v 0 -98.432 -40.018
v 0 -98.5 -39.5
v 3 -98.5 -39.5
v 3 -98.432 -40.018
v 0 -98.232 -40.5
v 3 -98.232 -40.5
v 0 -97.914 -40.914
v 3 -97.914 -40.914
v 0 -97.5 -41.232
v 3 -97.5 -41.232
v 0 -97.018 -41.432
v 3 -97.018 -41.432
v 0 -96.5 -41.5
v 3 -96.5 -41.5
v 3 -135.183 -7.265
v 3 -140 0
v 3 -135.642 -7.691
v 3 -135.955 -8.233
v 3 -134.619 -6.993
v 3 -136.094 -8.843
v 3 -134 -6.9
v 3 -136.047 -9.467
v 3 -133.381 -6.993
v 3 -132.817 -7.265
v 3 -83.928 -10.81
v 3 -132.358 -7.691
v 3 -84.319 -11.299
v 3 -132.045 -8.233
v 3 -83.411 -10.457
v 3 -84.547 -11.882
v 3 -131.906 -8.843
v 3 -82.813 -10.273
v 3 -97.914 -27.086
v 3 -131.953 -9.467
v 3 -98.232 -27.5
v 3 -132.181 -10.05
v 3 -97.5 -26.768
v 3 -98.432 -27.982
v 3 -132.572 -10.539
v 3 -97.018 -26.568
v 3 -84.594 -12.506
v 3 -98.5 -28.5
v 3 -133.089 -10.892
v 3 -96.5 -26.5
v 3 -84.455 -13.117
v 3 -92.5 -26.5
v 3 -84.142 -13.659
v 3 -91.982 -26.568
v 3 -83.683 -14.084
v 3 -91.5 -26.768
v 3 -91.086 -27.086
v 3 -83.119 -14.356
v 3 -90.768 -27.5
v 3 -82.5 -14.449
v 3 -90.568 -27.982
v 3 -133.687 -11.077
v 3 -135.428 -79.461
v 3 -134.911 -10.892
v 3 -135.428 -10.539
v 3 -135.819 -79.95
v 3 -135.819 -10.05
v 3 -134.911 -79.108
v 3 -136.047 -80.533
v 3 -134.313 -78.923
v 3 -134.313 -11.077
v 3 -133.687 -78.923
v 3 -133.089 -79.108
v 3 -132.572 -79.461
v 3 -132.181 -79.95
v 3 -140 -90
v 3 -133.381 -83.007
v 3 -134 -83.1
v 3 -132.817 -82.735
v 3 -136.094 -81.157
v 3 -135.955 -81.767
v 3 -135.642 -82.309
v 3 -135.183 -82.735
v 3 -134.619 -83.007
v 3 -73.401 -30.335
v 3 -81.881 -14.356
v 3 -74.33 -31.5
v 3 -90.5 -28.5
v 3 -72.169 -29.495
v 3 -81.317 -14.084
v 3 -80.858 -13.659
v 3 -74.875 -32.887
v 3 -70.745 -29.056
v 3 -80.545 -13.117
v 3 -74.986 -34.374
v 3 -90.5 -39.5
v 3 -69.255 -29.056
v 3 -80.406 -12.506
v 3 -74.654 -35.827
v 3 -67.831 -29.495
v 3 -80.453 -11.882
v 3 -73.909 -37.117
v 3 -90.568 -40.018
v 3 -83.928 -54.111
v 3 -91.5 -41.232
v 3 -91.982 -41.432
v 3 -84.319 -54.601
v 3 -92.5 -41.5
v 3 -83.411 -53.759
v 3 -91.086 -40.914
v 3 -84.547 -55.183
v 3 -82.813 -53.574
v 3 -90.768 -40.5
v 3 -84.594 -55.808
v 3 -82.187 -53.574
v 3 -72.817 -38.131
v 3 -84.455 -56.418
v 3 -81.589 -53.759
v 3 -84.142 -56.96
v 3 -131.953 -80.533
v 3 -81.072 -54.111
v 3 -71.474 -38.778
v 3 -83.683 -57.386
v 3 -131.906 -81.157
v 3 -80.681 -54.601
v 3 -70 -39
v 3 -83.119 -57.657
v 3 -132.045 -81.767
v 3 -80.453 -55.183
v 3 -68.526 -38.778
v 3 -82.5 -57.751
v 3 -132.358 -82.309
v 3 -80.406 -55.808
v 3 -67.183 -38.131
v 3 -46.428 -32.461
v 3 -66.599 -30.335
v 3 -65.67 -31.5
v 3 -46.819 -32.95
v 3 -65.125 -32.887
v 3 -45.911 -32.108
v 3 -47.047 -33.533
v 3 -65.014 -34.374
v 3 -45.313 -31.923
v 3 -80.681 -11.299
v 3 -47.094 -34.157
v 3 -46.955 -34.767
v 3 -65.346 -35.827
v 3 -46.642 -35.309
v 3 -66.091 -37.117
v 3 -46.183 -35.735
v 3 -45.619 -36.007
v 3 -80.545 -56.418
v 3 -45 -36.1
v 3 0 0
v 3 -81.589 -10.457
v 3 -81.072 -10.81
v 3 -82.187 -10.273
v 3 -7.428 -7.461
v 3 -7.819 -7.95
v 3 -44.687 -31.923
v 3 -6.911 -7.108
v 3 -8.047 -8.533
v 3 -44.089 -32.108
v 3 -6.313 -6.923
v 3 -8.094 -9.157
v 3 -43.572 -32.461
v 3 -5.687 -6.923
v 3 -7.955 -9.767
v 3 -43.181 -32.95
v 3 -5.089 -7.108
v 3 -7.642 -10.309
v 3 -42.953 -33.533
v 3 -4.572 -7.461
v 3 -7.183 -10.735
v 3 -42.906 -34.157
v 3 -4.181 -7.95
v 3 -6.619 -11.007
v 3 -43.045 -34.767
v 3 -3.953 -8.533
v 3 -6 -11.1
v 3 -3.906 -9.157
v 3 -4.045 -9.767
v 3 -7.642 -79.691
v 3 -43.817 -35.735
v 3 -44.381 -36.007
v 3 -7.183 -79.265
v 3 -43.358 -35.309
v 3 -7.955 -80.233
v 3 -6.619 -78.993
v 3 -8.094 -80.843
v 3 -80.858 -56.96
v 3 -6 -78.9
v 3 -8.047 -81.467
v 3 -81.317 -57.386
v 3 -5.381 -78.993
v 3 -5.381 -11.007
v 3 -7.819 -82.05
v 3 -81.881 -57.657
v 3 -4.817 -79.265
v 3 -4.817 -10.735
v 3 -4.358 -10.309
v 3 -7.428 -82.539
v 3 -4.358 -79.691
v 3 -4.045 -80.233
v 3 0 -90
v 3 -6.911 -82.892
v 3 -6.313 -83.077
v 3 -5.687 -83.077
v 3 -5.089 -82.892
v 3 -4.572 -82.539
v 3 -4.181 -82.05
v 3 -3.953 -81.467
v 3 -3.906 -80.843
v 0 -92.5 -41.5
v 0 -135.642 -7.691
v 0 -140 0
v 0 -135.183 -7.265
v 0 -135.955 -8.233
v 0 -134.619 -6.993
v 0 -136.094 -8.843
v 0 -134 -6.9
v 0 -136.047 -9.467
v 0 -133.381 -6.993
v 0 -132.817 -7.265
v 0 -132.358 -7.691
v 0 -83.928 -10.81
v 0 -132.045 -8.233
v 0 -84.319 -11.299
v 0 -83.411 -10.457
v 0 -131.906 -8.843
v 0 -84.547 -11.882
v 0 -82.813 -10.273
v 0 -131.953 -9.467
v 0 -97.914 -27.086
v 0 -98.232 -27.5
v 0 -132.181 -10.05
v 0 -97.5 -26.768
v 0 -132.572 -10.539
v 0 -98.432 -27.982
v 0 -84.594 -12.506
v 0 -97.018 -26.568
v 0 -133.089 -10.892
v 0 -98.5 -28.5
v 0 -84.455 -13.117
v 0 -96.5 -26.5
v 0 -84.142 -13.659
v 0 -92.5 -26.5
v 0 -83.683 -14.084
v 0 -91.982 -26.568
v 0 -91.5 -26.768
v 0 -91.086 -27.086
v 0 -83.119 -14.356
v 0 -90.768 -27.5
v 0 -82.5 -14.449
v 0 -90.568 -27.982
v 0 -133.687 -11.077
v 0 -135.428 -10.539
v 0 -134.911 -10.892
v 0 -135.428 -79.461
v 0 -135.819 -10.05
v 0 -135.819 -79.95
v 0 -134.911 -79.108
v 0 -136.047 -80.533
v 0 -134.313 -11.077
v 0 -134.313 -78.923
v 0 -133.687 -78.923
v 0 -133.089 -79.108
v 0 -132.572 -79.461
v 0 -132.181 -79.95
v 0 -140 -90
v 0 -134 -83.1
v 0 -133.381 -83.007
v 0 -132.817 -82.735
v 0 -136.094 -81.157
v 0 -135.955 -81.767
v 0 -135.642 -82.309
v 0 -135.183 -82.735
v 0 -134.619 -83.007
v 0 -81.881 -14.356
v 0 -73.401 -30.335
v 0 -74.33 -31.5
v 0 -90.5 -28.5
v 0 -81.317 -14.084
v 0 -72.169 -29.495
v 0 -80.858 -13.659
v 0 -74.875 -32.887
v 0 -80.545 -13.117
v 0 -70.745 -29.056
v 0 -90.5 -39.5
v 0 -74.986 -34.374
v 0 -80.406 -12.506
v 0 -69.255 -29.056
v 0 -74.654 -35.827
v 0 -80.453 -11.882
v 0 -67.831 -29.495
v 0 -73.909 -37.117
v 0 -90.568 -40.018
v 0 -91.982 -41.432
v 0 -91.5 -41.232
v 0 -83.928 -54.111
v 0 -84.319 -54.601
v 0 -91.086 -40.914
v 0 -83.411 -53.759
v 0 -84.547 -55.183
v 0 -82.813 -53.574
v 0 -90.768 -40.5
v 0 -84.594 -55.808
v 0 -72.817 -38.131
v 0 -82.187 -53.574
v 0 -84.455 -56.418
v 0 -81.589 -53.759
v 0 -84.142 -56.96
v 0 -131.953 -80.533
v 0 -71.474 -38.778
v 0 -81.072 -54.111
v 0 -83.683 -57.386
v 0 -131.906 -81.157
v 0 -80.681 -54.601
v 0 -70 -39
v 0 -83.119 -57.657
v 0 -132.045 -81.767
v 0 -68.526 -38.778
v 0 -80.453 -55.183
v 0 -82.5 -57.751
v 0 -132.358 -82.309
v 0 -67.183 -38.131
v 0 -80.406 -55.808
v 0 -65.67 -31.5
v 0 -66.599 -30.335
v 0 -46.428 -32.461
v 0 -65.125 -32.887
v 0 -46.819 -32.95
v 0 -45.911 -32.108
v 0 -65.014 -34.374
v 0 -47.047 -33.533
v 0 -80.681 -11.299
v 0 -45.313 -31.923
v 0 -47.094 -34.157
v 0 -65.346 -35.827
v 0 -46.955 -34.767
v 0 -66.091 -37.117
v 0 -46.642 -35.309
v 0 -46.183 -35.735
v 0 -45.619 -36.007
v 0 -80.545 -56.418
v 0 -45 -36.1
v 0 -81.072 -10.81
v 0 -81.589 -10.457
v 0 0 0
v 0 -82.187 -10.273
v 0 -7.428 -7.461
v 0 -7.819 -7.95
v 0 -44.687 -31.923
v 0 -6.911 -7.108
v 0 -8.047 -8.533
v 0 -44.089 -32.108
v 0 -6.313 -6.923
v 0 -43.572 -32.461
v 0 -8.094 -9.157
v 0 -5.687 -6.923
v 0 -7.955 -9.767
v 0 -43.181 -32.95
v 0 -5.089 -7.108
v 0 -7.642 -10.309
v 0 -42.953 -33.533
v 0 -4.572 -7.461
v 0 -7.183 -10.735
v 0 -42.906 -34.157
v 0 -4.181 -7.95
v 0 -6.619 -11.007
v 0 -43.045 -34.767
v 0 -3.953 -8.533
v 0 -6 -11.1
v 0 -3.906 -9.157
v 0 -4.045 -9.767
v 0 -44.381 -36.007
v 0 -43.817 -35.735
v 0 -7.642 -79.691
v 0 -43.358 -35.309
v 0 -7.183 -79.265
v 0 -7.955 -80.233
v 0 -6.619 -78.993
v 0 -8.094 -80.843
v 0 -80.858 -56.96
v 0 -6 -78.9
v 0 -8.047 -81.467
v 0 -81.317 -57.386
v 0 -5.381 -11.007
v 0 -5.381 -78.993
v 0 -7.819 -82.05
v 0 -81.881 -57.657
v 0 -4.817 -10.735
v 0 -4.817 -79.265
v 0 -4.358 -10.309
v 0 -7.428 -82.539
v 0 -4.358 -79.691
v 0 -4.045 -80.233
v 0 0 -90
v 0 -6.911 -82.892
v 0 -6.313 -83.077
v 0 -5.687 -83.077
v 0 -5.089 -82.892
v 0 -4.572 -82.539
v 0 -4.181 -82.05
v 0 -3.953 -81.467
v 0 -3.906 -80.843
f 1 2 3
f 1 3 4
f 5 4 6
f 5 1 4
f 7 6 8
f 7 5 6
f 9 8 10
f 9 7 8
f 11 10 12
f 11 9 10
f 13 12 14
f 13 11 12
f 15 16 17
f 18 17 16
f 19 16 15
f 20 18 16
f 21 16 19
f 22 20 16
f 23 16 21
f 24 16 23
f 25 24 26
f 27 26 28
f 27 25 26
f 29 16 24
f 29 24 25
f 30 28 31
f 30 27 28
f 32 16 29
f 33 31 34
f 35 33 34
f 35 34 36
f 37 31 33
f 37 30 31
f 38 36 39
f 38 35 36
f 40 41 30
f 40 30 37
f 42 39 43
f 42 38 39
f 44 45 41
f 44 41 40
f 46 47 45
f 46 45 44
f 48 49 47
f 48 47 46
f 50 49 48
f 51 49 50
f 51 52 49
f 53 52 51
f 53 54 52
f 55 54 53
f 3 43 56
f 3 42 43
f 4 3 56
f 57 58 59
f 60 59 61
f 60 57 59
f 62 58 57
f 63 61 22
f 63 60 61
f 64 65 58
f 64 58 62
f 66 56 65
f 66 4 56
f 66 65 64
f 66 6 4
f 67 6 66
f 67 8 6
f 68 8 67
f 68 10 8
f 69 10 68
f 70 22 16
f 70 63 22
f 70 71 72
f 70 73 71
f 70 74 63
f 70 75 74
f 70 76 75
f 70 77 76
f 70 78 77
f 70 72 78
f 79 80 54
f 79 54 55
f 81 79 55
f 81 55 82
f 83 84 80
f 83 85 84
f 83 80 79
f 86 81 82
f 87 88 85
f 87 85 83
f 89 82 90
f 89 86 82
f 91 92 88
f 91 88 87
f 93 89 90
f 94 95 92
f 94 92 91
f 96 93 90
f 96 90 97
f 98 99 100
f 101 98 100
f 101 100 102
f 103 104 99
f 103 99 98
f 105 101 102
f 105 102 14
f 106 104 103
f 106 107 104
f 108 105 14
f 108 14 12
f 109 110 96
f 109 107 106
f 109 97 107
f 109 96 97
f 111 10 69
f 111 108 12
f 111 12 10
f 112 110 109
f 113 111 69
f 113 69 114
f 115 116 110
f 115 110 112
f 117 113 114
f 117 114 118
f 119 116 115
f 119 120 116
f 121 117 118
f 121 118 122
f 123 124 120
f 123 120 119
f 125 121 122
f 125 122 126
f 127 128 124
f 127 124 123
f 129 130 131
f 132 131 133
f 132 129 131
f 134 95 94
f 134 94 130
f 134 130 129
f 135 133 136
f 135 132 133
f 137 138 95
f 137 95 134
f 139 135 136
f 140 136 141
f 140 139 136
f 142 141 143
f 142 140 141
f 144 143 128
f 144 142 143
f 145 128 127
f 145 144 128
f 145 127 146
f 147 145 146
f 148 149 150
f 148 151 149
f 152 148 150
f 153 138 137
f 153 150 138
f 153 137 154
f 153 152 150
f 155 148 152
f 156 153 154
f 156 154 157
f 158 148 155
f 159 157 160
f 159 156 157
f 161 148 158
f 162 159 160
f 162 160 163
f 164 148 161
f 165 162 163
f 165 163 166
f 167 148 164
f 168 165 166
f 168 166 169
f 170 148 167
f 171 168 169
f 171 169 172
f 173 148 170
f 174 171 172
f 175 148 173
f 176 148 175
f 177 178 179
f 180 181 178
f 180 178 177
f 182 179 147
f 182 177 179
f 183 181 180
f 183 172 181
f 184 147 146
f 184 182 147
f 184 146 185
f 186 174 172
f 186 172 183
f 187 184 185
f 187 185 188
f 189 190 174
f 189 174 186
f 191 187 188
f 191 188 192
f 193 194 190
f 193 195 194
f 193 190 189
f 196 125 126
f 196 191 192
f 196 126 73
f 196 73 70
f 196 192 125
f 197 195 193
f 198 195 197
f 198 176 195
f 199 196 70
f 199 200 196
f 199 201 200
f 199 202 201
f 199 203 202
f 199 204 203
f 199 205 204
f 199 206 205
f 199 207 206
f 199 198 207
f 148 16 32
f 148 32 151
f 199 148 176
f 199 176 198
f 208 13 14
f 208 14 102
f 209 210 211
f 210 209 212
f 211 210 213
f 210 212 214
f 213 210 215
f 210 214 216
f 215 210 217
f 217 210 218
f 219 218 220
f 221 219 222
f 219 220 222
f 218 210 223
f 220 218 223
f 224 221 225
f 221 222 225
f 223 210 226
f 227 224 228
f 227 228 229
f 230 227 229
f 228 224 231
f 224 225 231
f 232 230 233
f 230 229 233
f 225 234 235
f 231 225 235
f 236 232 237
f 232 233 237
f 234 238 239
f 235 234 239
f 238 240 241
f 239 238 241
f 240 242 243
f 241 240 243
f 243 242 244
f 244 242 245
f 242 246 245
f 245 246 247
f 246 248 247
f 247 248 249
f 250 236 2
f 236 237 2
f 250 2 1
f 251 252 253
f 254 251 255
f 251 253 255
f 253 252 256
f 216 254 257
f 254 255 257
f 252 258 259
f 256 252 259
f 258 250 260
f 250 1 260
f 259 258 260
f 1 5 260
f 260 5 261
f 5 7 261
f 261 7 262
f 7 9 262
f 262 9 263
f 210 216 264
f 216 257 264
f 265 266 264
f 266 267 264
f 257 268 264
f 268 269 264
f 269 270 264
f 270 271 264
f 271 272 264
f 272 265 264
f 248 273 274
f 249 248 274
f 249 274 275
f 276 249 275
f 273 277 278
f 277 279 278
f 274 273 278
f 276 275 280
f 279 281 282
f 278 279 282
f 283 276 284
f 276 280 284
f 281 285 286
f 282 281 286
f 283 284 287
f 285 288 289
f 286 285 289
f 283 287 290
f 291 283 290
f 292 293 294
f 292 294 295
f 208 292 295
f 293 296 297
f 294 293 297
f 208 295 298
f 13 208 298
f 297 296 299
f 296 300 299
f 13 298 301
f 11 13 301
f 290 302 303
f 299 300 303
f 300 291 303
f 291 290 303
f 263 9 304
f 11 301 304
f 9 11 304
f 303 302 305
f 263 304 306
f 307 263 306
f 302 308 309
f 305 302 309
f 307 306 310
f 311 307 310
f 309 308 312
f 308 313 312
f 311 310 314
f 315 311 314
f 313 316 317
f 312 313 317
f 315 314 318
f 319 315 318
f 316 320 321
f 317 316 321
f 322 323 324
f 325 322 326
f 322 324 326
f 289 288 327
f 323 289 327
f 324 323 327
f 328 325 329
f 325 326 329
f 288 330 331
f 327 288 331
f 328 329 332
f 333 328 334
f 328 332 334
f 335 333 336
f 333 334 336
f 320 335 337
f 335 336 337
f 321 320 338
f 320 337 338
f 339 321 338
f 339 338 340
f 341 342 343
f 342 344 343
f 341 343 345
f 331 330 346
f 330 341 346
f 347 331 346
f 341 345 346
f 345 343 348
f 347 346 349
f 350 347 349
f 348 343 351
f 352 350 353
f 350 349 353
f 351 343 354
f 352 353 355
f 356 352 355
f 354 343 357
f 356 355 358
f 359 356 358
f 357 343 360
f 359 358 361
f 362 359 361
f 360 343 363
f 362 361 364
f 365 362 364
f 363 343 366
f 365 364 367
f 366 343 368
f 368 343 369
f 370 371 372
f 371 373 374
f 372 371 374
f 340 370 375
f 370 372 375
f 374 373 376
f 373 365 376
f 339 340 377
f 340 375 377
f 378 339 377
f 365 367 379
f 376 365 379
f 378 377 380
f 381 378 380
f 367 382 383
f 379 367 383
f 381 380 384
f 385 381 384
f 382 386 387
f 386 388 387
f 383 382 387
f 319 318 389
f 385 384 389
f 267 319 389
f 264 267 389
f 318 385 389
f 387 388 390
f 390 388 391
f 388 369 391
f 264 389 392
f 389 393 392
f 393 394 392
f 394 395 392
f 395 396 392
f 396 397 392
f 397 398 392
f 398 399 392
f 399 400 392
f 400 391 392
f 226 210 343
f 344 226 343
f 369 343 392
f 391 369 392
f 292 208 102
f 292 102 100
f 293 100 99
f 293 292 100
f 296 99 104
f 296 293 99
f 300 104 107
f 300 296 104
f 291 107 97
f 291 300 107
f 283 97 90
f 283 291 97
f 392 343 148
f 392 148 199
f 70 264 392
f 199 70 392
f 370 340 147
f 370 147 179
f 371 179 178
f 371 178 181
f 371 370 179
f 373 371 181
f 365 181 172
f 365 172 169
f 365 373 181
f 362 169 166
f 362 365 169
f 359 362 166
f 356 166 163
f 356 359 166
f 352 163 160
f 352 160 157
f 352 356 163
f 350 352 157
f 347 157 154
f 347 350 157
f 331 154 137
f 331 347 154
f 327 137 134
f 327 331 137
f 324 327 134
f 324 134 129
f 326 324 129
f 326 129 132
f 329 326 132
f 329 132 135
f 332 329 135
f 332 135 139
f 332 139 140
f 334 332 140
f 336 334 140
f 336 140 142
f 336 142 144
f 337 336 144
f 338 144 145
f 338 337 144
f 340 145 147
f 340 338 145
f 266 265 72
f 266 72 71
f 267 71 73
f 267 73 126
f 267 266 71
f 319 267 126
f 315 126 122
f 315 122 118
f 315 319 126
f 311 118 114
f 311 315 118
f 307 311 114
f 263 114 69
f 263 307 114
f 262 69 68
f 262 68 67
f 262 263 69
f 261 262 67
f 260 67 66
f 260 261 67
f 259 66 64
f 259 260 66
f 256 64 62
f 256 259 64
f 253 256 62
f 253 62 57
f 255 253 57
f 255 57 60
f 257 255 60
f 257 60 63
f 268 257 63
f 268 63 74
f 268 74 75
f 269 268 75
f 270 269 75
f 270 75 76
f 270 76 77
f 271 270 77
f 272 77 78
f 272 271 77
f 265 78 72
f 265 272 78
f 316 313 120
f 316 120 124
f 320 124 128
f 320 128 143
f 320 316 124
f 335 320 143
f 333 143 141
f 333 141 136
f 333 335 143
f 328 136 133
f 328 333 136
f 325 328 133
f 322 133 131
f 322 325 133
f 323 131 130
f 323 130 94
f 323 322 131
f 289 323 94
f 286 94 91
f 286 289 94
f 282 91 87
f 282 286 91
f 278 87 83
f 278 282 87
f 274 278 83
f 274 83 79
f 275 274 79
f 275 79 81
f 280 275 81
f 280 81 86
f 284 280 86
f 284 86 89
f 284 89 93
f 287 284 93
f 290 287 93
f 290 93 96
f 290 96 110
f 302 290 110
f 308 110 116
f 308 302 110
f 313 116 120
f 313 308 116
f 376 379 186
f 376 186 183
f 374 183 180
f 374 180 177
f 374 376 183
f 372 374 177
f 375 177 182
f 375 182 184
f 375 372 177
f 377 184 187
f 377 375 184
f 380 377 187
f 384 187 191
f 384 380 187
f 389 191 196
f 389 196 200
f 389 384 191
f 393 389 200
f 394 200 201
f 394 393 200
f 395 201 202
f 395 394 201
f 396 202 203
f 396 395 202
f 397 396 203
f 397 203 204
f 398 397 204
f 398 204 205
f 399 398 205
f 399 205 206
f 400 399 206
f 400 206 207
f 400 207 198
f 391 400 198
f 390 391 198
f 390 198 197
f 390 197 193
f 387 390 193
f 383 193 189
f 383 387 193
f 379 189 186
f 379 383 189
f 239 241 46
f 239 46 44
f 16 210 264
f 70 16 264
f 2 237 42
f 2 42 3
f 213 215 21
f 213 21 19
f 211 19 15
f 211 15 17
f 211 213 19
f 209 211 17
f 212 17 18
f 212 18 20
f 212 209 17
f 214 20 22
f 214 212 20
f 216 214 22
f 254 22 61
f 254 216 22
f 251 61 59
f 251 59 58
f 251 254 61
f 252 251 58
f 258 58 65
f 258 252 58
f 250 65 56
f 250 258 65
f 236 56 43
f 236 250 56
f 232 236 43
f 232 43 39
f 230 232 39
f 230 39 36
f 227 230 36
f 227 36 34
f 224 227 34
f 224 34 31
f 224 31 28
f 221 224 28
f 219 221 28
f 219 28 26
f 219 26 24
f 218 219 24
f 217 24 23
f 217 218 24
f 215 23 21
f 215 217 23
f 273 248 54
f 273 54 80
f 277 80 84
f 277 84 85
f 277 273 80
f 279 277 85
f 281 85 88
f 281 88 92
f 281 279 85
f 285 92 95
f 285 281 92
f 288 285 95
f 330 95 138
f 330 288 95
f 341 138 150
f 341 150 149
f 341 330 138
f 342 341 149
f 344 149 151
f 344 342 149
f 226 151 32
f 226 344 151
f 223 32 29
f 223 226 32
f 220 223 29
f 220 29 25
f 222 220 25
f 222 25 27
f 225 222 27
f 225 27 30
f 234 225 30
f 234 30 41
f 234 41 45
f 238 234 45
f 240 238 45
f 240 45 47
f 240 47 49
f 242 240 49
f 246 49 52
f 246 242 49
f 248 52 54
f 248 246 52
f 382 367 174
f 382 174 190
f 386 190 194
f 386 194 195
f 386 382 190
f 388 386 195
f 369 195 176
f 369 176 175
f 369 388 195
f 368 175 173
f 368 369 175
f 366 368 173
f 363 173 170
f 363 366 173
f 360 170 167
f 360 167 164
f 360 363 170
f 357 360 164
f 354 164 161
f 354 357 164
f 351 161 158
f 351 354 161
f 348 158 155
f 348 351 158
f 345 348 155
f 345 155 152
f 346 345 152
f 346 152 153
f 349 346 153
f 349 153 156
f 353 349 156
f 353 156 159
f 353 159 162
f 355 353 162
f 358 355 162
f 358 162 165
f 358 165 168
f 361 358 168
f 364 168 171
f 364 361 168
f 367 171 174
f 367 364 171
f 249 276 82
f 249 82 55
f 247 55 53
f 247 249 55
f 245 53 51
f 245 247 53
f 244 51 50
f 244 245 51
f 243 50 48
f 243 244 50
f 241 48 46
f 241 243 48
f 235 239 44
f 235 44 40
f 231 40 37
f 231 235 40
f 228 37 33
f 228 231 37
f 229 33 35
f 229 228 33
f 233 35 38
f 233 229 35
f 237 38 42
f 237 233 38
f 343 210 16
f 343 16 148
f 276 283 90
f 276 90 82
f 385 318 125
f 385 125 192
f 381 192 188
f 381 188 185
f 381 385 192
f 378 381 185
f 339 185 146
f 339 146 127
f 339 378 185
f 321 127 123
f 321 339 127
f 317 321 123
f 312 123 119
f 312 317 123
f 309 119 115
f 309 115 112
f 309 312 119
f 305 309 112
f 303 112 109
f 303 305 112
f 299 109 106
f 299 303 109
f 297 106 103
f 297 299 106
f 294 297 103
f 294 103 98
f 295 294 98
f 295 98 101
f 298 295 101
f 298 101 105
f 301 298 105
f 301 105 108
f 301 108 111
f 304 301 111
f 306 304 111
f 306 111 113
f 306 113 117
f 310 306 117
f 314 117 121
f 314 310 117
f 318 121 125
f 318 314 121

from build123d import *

# Parameters (mm, degrees)
SKETCH1_W           = 90
SKETCH1_H           = 140
SKETCH1_R           = 5
SKETCH1_R_2         = 2.1
BOSS_EXTRUDE1_DEPTH = 3


with BuildPart() as part:
    # Sketch1 → Boss-Extrude1 (new body)
    with BuildSketch(Plane(origin=(0, 0, 0), x_dir=(0, 0, -1), z_dir=(1, 0, 0))):
        with Locations((45, -70)):
            Rectangle(SKETCH1_W, SKETCH1_H)
        with Locations((34, -70)):
            Circle(SKETCH1_R, mode=Mode.SUBTRACT)
        with Locations((34, -45)):
            Circle(SKETCH1_R_2, mode=Mode.SUBTRACT)
        with Locations((55.650635095, -82.5)):
            Circle(SKETCH1_R_2, mode=Mode.SUBTRACT)
        with Locations((12.349364905, -82.5)):
            Circle(SKETCH1_R_2, mode=Mode.SUBTRACT)
        with Locations((9, -6)):
            Circle(SKETCH1_R_2, mode=Mode.SUBTRACT)
        with Locations(Location((81, -6, 0), (0, 0, 180))):
            Circle(SKETCH1_R_2, mode=Mode.SUBTRACT)
        with Locations((81, -134)):
            Circle(SKETCH1_R_2, mode=Mode.SUBTRACT)
        with Locations(Location((9, -134, 0), (0, 0, 180))):
            Circle(SKETCH1_R_2, mode=Mode.SUBTRACT)
        with BuildLine():
            Line((34, -90.5), (28.5, -90.5))
            ThreePointArc((28.5, -90.5), (27.085786438, -91.085786438), (26.5, -92.5))
            Line((26.5, -92.5), (26.5, -96.5))
            ThreePointArc((26.5, -96.5), (27.085786438, -97.914213562), (28.5, -98.5))
            Line((28.5, -98.5), (39.5, -98.5))
            ThreePointArc((39.5, -98.5), (40.914213562, -97.914213562), (41.5, -96.5))
            Line((41.5, -96.5), (41.5, -92.5))
            ThreePointArc((41.5, -92.5), (40.914213562, -91.085786438), (39.5, -90.5))
            Line((39.5, -90.5), (34, -90.5))
        make_face(mode=Mode.SUBTRACT)
    extrude(amount=BOSS_EXTRUDE1_DEPTH)


solid = part.part
